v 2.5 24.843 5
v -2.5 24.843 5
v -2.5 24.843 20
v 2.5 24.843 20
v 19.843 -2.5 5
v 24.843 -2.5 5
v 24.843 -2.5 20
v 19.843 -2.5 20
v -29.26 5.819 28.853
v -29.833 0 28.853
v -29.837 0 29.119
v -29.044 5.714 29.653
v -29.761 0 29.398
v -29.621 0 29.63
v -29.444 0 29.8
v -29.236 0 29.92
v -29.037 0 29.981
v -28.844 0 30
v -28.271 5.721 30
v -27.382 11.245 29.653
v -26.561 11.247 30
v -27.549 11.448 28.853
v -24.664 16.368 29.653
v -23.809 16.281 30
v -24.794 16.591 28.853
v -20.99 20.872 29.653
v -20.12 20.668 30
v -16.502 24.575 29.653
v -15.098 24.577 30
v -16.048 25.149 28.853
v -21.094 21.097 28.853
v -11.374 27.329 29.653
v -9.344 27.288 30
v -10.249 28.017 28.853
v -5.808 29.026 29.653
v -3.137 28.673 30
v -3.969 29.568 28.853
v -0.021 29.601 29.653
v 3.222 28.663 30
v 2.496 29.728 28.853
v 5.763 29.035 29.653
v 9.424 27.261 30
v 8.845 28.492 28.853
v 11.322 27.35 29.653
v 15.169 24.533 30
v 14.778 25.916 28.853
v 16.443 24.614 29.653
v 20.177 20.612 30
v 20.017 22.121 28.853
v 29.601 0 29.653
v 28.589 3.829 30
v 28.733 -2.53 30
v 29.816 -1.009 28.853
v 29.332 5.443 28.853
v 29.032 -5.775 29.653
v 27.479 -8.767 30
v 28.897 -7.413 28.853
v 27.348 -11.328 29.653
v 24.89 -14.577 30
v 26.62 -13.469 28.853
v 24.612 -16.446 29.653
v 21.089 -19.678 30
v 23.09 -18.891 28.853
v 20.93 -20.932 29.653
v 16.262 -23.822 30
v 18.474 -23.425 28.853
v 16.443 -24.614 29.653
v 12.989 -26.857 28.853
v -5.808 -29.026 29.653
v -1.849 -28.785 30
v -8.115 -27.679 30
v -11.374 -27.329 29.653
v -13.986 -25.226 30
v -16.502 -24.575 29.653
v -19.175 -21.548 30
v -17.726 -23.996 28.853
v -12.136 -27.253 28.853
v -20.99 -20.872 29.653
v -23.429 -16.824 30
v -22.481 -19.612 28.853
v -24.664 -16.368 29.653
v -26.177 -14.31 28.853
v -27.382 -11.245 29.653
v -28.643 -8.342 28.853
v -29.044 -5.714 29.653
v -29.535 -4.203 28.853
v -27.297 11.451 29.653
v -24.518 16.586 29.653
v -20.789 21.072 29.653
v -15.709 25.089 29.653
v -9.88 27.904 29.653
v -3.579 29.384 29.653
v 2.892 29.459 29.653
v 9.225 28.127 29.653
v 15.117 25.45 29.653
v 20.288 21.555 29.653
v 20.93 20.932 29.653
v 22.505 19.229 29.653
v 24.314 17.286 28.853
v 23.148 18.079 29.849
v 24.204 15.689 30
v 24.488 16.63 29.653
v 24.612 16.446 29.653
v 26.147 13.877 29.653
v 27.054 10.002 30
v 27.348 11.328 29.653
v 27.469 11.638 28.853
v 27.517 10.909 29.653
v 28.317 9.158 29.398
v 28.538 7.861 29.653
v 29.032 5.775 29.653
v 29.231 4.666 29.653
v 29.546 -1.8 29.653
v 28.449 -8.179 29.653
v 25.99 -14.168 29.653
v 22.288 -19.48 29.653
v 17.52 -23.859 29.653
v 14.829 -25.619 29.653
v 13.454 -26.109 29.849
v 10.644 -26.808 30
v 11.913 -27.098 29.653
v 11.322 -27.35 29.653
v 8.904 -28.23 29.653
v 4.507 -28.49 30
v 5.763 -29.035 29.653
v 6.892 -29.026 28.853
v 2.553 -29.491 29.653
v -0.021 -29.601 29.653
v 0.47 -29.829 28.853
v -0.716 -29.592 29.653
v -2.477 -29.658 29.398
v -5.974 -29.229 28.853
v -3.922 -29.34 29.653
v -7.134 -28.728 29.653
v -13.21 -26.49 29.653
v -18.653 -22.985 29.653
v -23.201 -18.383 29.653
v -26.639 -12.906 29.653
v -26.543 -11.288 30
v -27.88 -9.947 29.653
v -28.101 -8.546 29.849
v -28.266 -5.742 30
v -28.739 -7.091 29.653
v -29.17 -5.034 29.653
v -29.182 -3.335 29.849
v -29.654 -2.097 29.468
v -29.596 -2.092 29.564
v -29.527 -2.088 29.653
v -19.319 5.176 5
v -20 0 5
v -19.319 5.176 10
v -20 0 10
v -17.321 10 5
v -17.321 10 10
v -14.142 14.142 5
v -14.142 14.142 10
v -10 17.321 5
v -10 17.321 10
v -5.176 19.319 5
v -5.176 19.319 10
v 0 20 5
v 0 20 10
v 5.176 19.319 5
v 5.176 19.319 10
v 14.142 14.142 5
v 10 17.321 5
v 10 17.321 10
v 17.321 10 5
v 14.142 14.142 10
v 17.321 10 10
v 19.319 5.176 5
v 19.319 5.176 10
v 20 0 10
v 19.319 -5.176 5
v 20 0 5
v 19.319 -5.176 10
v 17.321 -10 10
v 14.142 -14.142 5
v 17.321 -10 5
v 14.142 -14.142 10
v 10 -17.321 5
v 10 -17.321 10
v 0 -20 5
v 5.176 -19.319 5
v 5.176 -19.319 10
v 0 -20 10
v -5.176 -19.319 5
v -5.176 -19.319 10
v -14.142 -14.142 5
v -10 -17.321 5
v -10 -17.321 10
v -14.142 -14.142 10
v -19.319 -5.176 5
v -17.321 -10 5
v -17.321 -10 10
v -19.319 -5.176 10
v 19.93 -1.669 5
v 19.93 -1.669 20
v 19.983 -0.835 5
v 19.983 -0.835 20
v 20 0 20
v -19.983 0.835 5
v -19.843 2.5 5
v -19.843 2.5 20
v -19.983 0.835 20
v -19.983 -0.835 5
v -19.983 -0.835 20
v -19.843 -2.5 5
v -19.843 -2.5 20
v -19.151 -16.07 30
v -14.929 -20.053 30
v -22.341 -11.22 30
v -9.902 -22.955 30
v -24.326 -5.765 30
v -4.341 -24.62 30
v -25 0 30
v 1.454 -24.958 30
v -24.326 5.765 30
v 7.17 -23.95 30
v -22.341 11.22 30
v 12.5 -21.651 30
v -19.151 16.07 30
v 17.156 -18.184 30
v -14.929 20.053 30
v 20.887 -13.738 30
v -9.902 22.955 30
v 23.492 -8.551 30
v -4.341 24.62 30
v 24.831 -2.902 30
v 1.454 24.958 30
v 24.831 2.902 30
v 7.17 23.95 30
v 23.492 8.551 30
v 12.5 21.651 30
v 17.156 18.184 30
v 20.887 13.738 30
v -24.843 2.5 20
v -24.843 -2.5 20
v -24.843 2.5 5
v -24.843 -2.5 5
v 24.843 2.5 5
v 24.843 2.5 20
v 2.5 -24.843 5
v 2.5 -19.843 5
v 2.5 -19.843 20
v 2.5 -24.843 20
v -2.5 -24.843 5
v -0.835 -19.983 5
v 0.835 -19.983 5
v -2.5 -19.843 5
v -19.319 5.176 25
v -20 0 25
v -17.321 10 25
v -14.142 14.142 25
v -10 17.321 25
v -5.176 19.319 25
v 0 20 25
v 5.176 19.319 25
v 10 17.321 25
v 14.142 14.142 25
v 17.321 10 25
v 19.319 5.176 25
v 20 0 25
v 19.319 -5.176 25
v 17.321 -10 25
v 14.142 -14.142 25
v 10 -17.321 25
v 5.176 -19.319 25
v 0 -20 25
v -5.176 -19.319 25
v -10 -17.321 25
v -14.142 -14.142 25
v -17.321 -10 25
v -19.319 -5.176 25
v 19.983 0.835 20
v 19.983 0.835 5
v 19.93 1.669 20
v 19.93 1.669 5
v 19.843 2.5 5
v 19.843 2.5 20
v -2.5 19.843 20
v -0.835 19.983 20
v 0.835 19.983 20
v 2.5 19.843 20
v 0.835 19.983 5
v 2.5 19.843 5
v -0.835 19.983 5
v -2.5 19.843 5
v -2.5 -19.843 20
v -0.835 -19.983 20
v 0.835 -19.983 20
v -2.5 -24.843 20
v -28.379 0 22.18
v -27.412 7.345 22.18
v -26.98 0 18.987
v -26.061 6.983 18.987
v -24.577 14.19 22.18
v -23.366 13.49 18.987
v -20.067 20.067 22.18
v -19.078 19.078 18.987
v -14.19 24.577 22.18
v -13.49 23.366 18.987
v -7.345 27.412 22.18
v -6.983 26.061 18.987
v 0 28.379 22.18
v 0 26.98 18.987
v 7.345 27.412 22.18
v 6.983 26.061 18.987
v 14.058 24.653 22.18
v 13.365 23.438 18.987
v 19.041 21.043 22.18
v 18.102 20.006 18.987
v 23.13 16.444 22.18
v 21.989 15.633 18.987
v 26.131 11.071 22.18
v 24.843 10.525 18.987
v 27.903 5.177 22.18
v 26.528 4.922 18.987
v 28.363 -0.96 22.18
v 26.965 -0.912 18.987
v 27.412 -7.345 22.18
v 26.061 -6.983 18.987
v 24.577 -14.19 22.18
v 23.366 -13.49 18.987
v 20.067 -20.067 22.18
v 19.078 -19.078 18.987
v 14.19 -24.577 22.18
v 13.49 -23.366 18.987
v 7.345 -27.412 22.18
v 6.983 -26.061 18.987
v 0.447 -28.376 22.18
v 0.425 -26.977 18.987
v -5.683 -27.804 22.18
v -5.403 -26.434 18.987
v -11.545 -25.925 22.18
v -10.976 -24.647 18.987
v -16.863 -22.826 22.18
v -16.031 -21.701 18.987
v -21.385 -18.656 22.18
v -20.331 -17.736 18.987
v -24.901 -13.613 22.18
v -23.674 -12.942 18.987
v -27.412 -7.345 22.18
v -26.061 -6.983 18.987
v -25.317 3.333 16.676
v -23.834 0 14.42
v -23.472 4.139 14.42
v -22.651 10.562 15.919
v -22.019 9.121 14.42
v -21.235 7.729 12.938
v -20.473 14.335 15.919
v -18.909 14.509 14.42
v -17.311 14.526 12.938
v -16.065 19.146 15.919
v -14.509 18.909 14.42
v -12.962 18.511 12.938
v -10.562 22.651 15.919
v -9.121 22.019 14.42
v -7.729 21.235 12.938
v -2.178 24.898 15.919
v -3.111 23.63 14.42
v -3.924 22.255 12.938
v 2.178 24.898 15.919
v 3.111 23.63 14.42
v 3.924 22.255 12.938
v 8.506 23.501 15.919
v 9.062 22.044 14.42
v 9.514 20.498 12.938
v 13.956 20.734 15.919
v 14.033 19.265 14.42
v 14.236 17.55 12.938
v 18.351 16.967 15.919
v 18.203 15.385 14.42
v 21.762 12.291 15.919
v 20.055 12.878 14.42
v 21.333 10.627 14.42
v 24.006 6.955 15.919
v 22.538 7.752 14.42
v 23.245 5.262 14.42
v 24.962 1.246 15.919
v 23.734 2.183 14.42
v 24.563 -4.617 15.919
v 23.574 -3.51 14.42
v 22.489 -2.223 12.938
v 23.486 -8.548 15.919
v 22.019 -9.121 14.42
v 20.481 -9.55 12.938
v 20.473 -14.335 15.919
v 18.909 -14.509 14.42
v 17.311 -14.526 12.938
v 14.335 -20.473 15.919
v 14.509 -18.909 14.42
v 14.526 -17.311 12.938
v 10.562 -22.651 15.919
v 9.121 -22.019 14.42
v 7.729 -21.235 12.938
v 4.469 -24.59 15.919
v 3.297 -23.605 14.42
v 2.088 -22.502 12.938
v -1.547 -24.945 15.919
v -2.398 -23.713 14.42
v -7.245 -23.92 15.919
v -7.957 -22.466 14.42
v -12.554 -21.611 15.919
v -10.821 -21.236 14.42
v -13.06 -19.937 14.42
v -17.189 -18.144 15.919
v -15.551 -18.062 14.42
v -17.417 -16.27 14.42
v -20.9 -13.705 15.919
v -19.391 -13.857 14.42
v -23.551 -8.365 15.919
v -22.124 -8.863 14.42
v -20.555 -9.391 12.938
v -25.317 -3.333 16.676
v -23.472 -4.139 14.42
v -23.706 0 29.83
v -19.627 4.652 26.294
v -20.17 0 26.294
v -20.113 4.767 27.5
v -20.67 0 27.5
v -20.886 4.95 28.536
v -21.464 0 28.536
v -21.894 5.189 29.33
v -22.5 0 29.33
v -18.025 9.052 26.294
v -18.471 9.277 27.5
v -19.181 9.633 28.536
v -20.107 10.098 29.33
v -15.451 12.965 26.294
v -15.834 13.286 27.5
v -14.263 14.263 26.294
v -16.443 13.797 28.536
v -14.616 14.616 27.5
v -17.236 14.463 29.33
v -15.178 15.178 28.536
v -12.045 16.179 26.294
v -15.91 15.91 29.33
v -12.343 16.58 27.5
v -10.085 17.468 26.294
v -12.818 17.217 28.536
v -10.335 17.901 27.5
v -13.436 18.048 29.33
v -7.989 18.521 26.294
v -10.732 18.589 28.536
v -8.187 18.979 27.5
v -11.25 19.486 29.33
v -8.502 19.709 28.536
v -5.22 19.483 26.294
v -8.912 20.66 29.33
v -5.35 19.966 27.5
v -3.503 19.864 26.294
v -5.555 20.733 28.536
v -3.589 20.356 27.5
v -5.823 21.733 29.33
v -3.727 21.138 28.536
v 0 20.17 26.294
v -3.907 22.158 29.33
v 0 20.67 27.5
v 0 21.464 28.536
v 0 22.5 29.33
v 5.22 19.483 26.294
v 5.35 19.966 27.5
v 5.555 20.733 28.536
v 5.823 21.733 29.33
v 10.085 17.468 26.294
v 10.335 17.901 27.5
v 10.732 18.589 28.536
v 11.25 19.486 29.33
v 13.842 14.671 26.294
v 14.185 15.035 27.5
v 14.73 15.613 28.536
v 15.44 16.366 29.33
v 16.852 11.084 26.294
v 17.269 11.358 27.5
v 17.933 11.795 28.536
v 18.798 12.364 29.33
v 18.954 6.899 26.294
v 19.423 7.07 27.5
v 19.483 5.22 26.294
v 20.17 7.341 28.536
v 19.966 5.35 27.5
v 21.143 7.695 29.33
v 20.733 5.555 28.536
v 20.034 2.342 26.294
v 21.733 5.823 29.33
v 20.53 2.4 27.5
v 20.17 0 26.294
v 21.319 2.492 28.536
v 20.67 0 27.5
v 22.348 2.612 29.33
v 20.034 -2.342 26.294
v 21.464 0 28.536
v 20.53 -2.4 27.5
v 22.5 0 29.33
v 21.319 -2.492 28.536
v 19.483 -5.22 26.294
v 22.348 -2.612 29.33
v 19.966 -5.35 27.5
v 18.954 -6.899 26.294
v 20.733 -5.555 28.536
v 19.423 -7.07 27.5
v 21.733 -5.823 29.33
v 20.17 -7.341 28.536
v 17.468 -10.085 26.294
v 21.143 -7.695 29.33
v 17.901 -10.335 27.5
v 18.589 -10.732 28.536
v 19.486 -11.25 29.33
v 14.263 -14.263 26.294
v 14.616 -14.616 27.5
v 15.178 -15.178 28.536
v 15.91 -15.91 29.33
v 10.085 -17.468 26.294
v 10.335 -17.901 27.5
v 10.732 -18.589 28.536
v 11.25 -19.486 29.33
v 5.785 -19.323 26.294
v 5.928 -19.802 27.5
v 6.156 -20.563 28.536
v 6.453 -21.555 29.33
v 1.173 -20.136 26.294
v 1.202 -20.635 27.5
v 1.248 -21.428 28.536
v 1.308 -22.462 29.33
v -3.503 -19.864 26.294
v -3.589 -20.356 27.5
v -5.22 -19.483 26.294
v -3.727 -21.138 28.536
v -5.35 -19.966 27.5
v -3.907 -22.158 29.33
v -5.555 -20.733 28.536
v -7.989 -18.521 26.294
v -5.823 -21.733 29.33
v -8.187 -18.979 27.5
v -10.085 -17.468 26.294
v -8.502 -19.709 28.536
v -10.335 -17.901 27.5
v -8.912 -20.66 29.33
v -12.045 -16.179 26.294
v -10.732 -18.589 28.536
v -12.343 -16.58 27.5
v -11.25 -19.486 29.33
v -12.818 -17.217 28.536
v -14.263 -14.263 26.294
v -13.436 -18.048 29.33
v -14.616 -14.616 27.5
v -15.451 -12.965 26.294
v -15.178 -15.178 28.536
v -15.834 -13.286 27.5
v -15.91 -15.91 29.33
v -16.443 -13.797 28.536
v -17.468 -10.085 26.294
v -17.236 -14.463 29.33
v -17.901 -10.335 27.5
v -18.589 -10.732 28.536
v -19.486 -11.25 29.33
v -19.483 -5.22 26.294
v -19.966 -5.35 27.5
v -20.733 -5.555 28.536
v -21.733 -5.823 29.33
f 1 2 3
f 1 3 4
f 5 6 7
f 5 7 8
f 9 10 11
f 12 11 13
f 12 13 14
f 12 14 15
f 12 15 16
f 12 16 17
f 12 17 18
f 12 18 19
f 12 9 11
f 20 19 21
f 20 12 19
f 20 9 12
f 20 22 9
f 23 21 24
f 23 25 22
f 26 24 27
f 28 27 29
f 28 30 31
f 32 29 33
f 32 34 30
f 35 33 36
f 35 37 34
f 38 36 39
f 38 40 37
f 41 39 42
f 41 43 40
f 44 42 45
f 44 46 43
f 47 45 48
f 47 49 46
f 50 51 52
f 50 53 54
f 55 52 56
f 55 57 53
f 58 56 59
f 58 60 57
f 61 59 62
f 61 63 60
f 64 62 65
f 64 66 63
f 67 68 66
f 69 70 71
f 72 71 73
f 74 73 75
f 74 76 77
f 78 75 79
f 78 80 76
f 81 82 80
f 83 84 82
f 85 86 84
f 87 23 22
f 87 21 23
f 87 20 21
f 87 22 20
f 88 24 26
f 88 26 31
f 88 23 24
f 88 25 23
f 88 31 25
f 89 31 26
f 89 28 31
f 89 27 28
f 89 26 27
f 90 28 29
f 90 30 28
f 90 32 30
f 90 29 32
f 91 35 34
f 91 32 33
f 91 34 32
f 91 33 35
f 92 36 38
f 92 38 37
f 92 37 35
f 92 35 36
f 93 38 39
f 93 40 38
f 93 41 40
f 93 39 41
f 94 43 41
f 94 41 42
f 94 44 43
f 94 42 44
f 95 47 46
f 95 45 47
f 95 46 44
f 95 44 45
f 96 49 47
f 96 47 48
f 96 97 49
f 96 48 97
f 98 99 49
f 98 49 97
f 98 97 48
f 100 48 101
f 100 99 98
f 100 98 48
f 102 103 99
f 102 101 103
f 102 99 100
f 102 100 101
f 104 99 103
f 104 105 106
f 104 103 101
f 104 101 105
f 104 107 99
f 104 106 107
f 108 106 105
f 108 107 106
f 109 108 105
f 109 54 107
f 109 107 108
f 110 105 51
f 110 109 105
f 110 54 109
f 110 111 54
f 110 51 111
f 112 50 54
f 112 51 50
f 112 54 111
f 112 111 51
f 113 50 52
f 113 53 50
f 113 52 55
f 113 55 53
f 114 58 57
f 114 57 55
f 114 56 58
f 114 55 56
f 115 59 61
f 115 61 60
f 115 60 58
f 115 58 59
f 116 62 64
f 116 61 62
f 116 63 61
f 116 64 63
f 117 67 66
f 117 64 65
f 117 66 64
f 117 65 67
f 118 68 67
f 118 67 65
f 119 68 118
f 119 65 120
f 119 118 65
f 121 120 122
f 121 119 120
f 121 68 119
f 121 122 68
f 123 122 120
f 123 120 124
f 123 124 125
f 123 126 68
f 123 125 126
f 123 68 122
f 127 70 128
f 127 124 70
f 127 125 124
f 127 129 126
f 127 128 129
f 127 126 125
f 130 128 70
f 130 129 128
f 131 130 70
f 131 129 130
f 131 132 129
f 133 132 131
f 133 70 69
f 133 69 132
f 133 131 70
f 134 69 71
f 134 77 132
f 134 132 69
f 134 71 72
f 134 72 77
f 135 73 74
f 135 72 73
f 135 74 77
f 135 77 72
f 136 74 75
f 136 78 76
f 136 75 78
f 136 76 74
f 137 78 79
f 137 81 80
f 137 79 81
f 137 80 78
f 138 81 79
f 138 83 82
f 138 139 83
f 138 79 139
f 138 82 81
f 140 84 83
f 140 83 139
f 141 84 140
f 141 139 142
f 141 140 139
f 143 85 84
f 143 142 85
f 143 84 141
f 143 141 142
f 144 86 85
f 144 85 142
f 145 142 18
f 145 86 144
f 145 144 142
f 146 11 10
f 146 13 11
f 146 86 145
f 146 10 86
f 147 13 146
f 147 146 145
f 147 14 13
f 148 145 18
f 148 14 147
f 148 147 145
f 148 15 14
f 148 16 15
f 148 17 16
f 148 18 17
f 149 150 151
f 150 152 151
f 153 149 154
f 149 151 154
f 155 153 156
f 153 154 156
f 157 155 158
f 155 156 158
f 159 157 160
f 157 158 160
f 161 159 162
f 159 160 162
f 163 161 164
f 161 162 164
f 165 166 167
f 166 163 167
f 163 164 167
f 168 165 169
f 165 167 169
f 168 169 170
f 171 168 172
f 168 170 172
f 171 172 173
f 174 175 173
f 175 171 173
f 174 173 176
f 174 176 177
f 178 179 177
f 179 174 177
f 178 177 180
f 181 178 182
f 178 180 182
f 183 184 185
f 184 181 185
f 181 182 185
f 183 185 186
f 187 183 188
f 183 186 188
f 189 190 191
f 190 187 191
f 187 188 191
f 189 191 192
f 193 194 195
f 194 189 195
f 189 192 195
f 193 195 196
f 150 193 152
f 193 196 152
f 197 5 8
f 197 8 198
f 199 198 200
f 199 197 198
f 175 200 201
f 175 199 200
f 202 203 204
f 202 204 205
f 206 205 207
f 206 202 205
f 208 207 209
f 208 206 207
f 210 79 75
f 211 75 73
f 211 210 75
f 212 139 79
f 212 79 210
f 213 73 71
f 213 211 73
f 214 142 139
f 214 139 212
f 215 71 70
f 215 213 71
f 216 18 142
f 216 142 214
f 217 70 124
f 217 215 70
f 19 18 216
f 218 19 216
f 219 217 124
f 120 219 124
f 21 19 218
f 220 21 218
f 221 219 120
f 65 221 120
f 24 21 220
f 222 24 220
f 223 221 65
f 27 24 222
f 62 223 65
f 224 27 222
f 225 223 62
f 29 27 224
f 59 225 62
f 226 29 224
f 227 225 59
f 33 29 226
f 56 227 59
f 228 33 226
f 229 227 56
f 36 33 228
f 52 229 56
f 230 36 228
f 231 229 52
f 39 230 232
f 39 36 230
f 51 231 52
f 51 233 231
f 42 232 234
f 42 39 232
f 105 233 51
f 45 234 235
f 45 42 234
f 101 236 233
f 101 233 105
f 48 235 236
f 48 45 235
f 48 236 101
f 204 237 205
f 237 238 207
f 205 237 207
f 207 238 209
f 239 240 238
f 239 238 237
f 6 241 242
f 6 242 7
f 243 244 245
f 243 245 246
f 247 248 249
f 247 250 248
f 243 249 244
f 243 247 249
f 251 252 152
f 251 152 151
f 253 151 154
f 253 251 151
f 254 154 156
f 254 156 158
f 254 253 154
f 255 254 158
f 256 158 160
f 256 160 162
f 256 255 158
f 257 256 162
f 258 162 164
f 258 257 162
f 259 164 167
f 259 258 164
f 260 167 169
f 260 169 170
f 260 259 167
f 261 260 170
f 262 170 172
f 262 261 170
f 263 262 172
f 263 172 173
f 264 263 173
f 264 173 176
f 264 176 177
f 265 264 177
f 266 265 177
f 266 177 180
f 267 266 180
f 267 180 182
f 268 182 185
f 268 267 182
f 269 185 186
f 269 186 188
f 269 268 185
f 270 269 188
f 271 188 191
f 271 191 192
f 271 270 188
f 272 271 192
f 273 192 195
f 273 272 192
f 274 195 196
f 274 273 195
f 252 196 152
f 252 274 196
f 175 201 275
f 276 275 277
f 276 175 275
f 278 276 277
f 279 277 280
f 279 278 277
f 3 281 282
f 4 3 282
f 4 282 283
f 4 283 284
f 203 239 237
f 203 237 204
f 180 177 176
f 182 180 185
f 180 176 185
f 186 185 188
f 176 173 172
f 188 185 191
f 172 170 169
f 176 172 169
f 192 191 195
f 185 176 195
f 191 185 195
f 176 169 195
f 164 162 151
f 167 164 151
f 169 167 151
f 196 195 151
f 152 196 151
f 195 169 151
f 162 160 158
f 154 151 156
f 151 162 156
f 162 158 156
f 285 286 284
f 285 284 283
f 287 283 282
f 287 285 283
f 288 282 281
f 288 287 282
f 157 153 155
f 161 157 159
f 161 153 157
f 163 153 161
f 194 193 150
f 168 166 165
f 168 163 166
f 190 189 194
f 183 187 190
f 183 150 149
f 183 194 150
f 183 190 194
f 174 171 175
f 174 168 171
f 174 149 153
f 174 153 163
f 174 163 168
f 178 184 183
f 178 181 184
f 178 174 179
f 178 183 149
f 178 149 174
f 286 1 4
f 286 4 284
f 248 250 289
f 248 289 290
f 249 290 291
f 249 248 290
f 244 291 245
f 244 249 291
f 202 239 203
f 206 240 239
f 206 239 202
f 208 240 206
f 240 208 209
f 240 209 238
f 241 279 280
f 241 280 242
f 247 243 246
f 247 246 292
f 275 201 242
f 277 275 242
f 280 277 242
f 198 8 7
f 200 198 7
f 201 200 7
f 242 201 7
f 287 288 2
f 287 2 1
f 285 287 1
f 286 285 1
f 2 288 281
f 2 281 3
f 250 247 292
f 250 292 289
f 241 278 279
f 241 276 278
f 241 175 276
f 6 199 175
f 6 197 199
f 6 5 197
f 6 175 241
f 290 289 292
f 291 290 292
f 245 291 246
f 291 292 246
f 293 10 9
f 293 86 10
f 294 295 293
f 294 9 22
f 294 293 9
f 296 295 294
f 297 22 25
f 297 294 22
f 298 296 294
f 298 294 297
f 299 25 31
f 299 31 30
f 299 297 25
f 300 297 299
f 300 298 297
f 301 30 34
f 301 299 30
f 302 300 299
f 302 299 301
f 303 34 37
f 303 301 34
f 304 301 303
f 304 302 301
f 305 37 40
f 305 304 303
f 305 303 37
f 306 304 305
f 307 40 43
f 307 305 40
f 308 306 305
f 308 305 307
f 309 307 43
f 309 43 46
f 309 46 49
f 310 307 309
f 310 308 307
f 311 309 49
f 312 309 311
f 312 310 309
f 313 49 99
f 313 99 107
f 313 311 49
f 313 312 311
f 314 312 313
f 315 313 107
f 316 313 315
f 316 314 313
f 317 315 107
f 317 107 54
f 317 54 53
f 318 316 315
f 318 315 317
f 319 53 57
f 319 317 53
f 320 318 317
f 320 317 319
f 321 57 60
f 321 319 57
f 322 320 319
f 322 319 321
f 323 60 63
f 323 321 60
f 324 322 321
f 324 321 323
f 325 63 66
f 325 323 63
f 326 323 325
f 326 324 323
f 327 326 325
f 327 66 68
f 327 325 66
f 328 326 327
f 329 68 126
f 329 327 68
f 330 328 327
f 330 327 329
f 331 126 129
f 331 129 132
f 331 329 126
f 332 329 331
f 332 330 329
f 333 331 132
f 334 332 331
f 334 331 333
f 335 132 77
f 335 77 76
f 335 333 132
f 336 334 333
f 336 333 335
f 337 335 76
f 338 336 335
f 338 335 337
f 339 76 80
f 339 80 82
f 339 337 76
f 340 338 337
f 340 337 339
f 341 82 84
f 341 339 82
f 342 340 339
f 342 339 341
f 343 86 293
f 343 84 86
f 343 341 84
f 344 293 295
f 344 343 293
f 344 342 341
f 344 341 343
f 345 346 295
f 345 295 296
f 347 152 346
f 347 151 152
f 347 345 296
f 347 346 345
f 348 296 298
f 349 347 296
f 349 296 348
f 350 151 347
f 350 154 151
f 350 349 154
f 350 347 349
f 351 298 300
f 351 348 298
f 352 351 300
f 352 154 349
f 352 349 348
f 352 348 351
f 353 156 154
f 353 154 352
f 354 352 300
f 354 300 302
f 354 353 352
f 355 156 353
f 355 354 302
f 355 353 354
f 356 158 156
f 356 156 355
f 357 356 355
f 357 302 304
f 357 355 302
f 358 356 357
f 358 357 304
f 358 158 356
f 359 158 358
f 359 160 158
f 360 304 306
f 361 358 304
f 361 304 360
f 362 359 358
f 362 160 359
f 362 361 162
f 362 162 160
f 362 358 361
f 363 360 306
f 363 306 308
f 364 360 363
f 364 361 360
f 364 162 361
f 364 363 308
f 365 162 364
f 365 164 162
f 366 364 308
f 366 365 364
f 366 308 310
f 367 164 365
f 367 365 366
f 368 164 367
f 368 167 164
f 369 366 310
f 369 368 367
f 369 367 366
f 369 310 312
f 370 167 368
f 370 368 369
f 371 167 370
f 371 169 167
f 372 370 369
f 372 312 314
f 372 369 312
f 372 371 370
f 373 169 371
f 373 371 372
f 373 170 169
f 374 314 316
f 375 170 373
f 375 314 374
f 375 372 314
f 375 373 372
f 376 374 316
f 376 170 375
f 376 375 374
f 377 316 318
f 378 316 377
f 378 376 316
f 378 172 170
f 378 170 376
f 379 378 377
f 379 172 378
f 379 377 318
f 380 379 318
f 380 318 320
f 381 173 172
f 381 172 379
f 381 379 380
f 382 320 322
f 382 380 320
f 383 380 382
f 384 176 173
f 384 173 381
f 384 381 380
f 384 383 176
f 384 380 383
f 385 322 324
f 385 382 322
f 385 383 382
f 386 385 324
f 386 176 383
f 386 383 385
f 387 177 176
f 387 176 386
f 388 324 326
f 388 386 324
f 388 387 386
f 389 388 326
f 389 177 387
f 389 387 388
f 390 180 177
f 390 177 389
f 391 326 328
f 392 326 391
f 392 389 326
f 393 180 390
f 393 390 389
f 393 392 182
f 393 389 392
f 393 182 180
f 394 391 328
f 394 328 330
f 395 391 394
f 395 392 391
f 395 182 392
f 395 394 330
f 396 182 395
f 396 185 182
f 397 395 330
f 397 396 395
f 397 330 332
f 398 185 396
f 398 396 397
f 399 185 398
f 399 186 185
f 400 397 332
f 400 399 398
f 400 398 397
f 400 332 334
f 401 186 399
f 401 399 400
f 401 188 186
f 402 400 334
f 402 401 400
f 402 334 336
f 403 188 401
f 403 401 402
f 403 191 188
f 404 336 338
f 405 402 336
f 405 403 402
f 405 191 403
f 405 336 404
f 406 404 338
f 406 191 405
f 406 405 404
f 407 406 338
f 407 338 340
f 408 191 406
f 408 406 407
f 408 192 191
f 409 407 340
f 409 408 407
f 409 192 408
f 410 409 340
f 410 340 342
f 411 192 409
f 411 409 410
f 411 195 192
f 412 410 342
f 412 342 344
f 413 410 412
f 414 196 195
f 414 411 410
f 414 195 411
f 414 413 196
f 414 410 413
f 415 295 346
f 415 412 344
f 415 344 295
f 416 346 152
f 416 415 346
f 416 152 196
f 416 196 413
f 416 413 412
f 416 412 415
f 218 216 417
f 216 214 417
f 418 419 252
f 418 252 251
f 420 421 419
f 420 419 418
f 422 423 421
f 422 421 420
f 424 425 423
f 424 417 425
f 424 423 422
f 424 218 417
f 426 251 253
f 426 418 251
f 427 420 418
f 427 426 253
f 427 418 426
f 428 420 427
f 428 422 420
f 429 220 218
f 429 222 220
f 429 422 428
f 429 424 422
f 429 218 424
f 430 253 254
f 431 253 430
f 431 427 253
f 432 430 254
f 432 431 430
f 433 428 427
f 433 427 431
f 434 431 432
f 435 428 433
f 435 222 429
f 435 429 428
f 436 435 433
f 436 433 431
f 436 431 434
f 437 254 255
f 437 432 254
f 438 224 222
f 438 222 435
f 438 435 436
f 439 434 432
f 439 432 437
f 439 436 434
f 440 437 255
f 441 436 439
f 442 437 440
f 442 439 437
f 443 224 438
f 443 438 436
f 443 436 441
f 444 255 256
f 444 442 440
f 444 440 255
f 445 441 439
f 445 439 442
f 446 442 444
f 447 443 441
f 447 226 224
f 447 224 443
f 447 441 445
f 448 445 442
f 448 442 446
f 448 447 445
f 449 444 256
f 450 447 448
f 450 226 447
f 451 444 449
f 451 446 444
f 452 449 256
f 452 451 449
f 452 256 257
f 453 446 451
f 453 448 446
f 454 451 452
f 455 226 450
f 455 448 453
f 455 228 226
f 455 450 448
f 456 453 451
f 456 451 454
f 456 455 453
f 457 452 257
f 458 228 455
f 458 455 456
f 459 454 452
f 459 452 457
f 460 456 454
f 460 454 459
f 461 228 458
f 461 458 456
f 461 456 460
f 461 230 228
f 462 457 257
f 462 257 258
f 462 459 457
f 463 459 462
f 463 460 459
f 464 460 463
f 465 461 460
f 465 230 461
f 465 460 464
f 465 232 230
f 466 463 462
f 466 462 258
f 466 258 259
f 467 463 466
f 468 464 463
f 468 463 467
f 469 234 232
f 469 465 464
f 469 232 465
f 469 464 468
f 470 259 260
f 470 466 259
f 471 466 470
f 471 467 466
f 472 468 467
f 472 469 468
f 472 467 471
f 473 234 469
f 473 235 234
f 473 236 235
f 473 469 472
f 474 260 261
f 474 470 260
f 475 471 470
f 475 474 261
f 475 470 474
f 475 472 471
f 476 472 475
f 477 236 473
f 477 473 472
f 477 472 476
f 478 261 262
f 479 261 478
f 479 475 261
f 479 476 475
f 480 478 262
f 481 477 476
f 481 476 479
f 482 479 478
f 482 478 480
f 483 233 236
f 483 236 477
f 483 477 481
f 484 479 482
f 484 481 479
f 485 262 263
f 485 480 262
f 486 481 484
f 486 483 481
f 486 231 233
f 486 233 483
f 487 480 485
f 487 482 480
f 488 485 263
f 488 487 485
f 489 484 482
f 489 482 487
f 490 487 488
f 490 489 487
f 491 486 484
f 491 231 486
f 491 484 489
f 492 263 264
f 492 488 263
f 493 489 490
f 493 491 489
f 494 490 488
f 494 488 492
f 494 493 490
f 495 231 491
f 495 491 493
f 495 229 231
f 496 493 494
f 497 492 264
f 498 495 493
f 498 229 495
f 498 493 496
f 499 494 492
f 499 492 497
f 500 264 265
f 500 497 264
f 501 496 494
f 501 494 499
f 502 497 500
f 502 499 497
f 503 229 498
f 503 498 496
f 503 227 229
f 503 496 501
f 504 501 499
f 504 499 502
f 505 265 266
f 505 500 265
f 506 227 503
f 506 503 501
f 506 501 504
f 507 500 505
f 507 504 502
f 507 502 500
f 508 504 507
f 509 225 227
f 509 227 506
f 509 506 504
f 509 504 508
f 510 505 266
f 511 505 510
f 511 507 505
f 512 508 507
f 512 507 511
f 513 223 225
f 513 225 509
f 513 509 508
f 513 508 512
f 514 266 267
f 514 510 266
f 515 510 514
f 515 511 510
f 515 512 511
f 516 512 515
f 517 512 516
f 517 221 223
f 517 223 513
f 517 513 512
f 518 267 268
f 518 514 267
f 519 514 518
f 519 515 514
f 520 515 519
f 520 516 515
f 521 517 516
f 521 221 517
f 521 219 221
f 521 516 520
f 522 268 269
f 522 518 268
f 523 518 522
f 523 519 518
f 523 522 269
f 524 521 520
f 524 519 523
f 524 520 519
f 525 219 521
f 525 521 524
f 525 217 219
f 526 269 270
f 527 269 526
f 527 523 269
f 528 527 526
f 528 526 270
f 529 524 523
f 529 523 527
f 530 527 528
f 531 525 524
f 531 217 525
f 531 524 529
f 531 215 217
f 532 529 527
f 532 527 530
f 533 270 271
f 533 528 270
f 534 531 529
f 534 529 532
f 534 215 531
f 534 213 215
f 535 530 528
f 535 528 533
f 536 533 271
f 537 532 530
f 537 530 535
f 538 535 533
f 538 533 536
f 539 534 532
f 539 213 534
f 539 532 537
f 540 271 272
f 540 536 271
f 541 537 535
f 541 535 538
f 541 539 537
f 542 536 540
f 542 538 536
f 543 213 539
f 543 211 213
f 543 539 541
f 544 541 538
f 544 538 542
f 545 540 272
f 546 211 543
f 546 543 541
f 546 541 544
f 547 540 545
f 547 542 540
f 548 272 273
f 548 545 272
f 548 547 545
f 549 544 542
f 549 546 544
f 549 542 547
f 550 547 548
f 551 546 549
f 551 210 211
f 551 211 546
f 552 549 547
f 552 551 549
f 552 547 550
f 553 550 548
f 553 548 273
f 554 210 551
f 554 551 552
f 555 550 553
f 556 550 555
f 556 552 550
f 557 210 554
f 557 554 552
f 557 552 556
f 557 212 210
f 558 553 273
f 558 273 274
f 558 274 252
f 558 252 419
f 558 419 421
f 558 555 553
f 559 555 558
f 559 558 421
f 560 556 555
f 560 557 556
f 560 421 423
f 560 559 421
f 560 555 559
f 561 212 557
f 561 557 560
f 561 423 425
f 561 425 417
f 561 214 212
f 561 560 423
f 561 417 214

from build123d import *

# Parameters (mm, degrees)
F0_W      = 20
F0_H      = 10
F2_R      = 5
F4_DEPTH  = 20
F5_R      = 1
F1_FACE_R = 20
F6_DEPTH  = 5


with BuildPart() as f1:
    # F0 (on Front) → F1 (revolve)
    with BuildSketch(Plane.XZ):
        with BuildLine():
            add(Edge.make_bspline(
                [(-30, 30), (-29.5085835647, 26.5937616974), (-28.4760111656, 19.436517039), (-22.9146351429, 13.2449230719), (-20, 10)],
                knots=[0, 0, 0, 0, 0.47591475, 1, 1, 1, 1], degree=3))
            Line((-20, 10), (-20, 30))
            Line((-20, 30), (-25, 30))
            Line((-25, 30), (-30, 30))
        make_face()
    revolve(axis=Axis((0, 0, 5), (0, 0, -1)))

    # F2
    f2_edges = [f1.edges().sort_by_distance(p)[0] for p in [
        (20, 0, 30),
    ]]
    fillet(f2_edges, radius=F2_R)

    # F5
    f5_edges = [f1.edges().sort_by_distance(p)[0] for p in [
        (30, 0, 30),
    ]]
    fillet(f5_edges, radius=F5_R)


with BuildPart() as f1b:
    # F0 (on Front) → F1, piece 2 (revolve)
    with BuildSketch(Plane.XZ):
        with Locations((-10, 5)):
            Rectangle(F0_W, F0_H)
    revolve(axis=Axis((0, 0, 5), (0, 0, -1)))


with BuildPart() as f4:
    # F3 (on face) → F4 (new body)
    with BuildSketch(Plane(origin=(0, 0, 0), x_dir=(1, 0, 0), z_dir=(0, 0, -1))):
        with BuildLine():
            Line((24.843134833, 2.5), (19.843134833, 2.5))
            ThreePointArc((19.843134833, 2.5), (19.9607451847, 1.2524582509), (20, 0))
            ThreePointArc((20, 0), (19.9607451847, -1.2524582509), (19.843134833, -2.5))
            Line((19.843134833, -2.5), (24.843134833, -2.5))
            Line((24.843134833, -2.5), (24.843134833, 2.5))
        make_face()
    extrude(amount=-F4_DEPTH)


with BuildPart() as f4b:
    # F3 (on face) → F4, piece 2 (new body)
    with BuildSketch(Plane(origin=(0, 0, 0), x_dir=(1, 0, 0), z_dir=(0, 0, -1))):
        with BuildLine():
            ThreePointArc((2.5, -19.843134833), (0, -20), (-2.5, -19.843134833))
            Line((-2.5, -19.843134833), (-2.5, -24.843134833))
            Line((-2.5, -24.843134833), (2.5, -24.843134833))
            Line((2.5, -24.843134833), (2.5, -19.843134833))
        make_face()
    extrude(amount=-F4_DEPTH)


with BuildPart() as f4c:
    # F3 (on face) → F4, piece 3 (new body)
    with BuildSketch(Plane(origin=(0, 0, 0), x_dir=(1, 0, 0), z_dir=(0, 0, -1))):
        with BuildLine():
            Line((-2.5, 24.843134833), (-2.5, 19.843134833))
            ThreePointArc((-2.5, 19.843134833), (0, 20), (2.5, 19.843134833))
            Line((2.5, 19.843134833), (2.5, 24.843134833))
            Line((2.5, 24.843134833), (-2.5, 24.843134833))
        make_face()
    extrude(amount=-F4_DEPTH)


with BuildPart() as f4d:
    # F3 (on face) → F4, piece 4 (new body)
    with BuildSketch(Plane(origin=(0, 0, 0), x_dir=(1, 0, 0), z_dir=(0, 0, -1))):
        with BuildLine():
            ThreePointArc((-19.843134833, -2.5), (-20, 0), (-19.843134833, 2.5))
            Line((-19.843134833, 2.5), (-24.843134833, 2.5))
            Line((-24.843134833, 2.5), (-24.843134833, -2.5))
            Line((-24.843134833, -2.5), (-19.843134833, -2.5))
        make_face()
    extrude(amount=-F4_DEPTH)


with BuildPart() as f6_tool:
    # F1_face (on face) + F4_face (on face) → F6 (new body)
    with BuildSketch(Plane(origin=(0, 0, 0), x_dir=(1, 0, 0), z_dir=(0, 0, -1))):
        Circle(F1_FACE_R)
    with BuildSketch(Plane(origin=(0, -22.3952412212, 0), x_dir=(1, 0, 0), z_dir=(0, 0, -1))):
        with BuildLine():
            Line((2.5, -2.5521063882), (2.5, 2.4478936118))
            Line((2.5, 2.4478936118), (-2.5, 2.4478936118))
            Line((-2.5, 2.4478936118), (-2.5, -2.5521063882))
            ThreePointArc((-2.5, -2.5521063882), (0, -2.3952412212), (2.5, -2.5521063882))
        make_face()
        with BuildLine():
            Line((-19.843134833, -19.8952412212), (-24.843134833, -19.8952412212))
            Line((-24.843134833, -19.8952412212), (-24.843134833, -24.8952412212))
            Line((-24.843134833, -24.8952412212), (-19.843134833, -24.8952412212))
            ThreePointArc((-19.843134833, -24.8952412212), (-20, -22.3952412212), (-19.843134833, -19.8952412212))
        make_face()
        with BuildLine():
            Line((-2.5, -42.2383760542), (-2.5, -47.2383760542))
            Line((-2.5, -47.2383760542), (2.5, -47.2383760542))
            Line((2.5, -47.2383760542), (2.5, -42.2383760542))
            ThreePointArc((2.5, -42.2383760542), (0, -42.3952412212), (-2.5, -42.2383760542))
        make_face()
        with BuildLine():
            Line((19.843134833, -24.8952412212), (24.843134833, -24.8952412212))
            Line((24.843134833, -24.8952412212), (24.843134833, -19.8952412212))
            Line((24.843134833, -19.8952412212), (19.843134833, -19.8952412212))
            ThreePointArc((19.843134833, -19.8952412212), (20, -22.3952412212), (19.843134833, -24.8952412212))
        make_face()
    extrude(amount=-F6_DEPTH)


with BuildPart() as f1b_1:
    add(f1b.part)

    # F6: cut by f6_tool
    add(f6_tool.part, mode=Mode.SUBTRACT)


with BuildPart() as f4_1:
    add(f4.part)

    # F6: cut by f6_tool
    add(f6_tool.part, mode=Mode.SUBTRACT)


with BuildPart() as f4b_1:
    add(f4b.part)

    # F6: cut by f6_tool
    add(f6_tool.part, mode=Mode.SUBTRACT)


with BuildPart() as f4c_1:
    add(f4c.part)

    # F6: cut by f6_tool
    add(f6_tool.part, mode=Mode.SUBTRACT)


with BuildPart() as f4d_1:
    add(f4d.part)

    # F6: cut by f6_tool
    add(f6_tool.part, mode=Mode.SUBTRACT)


solid = Compound([f1.part, f1b_1.part, f4_1.part, f4b_1.part, f4c_1.part, f4d_1.part])
